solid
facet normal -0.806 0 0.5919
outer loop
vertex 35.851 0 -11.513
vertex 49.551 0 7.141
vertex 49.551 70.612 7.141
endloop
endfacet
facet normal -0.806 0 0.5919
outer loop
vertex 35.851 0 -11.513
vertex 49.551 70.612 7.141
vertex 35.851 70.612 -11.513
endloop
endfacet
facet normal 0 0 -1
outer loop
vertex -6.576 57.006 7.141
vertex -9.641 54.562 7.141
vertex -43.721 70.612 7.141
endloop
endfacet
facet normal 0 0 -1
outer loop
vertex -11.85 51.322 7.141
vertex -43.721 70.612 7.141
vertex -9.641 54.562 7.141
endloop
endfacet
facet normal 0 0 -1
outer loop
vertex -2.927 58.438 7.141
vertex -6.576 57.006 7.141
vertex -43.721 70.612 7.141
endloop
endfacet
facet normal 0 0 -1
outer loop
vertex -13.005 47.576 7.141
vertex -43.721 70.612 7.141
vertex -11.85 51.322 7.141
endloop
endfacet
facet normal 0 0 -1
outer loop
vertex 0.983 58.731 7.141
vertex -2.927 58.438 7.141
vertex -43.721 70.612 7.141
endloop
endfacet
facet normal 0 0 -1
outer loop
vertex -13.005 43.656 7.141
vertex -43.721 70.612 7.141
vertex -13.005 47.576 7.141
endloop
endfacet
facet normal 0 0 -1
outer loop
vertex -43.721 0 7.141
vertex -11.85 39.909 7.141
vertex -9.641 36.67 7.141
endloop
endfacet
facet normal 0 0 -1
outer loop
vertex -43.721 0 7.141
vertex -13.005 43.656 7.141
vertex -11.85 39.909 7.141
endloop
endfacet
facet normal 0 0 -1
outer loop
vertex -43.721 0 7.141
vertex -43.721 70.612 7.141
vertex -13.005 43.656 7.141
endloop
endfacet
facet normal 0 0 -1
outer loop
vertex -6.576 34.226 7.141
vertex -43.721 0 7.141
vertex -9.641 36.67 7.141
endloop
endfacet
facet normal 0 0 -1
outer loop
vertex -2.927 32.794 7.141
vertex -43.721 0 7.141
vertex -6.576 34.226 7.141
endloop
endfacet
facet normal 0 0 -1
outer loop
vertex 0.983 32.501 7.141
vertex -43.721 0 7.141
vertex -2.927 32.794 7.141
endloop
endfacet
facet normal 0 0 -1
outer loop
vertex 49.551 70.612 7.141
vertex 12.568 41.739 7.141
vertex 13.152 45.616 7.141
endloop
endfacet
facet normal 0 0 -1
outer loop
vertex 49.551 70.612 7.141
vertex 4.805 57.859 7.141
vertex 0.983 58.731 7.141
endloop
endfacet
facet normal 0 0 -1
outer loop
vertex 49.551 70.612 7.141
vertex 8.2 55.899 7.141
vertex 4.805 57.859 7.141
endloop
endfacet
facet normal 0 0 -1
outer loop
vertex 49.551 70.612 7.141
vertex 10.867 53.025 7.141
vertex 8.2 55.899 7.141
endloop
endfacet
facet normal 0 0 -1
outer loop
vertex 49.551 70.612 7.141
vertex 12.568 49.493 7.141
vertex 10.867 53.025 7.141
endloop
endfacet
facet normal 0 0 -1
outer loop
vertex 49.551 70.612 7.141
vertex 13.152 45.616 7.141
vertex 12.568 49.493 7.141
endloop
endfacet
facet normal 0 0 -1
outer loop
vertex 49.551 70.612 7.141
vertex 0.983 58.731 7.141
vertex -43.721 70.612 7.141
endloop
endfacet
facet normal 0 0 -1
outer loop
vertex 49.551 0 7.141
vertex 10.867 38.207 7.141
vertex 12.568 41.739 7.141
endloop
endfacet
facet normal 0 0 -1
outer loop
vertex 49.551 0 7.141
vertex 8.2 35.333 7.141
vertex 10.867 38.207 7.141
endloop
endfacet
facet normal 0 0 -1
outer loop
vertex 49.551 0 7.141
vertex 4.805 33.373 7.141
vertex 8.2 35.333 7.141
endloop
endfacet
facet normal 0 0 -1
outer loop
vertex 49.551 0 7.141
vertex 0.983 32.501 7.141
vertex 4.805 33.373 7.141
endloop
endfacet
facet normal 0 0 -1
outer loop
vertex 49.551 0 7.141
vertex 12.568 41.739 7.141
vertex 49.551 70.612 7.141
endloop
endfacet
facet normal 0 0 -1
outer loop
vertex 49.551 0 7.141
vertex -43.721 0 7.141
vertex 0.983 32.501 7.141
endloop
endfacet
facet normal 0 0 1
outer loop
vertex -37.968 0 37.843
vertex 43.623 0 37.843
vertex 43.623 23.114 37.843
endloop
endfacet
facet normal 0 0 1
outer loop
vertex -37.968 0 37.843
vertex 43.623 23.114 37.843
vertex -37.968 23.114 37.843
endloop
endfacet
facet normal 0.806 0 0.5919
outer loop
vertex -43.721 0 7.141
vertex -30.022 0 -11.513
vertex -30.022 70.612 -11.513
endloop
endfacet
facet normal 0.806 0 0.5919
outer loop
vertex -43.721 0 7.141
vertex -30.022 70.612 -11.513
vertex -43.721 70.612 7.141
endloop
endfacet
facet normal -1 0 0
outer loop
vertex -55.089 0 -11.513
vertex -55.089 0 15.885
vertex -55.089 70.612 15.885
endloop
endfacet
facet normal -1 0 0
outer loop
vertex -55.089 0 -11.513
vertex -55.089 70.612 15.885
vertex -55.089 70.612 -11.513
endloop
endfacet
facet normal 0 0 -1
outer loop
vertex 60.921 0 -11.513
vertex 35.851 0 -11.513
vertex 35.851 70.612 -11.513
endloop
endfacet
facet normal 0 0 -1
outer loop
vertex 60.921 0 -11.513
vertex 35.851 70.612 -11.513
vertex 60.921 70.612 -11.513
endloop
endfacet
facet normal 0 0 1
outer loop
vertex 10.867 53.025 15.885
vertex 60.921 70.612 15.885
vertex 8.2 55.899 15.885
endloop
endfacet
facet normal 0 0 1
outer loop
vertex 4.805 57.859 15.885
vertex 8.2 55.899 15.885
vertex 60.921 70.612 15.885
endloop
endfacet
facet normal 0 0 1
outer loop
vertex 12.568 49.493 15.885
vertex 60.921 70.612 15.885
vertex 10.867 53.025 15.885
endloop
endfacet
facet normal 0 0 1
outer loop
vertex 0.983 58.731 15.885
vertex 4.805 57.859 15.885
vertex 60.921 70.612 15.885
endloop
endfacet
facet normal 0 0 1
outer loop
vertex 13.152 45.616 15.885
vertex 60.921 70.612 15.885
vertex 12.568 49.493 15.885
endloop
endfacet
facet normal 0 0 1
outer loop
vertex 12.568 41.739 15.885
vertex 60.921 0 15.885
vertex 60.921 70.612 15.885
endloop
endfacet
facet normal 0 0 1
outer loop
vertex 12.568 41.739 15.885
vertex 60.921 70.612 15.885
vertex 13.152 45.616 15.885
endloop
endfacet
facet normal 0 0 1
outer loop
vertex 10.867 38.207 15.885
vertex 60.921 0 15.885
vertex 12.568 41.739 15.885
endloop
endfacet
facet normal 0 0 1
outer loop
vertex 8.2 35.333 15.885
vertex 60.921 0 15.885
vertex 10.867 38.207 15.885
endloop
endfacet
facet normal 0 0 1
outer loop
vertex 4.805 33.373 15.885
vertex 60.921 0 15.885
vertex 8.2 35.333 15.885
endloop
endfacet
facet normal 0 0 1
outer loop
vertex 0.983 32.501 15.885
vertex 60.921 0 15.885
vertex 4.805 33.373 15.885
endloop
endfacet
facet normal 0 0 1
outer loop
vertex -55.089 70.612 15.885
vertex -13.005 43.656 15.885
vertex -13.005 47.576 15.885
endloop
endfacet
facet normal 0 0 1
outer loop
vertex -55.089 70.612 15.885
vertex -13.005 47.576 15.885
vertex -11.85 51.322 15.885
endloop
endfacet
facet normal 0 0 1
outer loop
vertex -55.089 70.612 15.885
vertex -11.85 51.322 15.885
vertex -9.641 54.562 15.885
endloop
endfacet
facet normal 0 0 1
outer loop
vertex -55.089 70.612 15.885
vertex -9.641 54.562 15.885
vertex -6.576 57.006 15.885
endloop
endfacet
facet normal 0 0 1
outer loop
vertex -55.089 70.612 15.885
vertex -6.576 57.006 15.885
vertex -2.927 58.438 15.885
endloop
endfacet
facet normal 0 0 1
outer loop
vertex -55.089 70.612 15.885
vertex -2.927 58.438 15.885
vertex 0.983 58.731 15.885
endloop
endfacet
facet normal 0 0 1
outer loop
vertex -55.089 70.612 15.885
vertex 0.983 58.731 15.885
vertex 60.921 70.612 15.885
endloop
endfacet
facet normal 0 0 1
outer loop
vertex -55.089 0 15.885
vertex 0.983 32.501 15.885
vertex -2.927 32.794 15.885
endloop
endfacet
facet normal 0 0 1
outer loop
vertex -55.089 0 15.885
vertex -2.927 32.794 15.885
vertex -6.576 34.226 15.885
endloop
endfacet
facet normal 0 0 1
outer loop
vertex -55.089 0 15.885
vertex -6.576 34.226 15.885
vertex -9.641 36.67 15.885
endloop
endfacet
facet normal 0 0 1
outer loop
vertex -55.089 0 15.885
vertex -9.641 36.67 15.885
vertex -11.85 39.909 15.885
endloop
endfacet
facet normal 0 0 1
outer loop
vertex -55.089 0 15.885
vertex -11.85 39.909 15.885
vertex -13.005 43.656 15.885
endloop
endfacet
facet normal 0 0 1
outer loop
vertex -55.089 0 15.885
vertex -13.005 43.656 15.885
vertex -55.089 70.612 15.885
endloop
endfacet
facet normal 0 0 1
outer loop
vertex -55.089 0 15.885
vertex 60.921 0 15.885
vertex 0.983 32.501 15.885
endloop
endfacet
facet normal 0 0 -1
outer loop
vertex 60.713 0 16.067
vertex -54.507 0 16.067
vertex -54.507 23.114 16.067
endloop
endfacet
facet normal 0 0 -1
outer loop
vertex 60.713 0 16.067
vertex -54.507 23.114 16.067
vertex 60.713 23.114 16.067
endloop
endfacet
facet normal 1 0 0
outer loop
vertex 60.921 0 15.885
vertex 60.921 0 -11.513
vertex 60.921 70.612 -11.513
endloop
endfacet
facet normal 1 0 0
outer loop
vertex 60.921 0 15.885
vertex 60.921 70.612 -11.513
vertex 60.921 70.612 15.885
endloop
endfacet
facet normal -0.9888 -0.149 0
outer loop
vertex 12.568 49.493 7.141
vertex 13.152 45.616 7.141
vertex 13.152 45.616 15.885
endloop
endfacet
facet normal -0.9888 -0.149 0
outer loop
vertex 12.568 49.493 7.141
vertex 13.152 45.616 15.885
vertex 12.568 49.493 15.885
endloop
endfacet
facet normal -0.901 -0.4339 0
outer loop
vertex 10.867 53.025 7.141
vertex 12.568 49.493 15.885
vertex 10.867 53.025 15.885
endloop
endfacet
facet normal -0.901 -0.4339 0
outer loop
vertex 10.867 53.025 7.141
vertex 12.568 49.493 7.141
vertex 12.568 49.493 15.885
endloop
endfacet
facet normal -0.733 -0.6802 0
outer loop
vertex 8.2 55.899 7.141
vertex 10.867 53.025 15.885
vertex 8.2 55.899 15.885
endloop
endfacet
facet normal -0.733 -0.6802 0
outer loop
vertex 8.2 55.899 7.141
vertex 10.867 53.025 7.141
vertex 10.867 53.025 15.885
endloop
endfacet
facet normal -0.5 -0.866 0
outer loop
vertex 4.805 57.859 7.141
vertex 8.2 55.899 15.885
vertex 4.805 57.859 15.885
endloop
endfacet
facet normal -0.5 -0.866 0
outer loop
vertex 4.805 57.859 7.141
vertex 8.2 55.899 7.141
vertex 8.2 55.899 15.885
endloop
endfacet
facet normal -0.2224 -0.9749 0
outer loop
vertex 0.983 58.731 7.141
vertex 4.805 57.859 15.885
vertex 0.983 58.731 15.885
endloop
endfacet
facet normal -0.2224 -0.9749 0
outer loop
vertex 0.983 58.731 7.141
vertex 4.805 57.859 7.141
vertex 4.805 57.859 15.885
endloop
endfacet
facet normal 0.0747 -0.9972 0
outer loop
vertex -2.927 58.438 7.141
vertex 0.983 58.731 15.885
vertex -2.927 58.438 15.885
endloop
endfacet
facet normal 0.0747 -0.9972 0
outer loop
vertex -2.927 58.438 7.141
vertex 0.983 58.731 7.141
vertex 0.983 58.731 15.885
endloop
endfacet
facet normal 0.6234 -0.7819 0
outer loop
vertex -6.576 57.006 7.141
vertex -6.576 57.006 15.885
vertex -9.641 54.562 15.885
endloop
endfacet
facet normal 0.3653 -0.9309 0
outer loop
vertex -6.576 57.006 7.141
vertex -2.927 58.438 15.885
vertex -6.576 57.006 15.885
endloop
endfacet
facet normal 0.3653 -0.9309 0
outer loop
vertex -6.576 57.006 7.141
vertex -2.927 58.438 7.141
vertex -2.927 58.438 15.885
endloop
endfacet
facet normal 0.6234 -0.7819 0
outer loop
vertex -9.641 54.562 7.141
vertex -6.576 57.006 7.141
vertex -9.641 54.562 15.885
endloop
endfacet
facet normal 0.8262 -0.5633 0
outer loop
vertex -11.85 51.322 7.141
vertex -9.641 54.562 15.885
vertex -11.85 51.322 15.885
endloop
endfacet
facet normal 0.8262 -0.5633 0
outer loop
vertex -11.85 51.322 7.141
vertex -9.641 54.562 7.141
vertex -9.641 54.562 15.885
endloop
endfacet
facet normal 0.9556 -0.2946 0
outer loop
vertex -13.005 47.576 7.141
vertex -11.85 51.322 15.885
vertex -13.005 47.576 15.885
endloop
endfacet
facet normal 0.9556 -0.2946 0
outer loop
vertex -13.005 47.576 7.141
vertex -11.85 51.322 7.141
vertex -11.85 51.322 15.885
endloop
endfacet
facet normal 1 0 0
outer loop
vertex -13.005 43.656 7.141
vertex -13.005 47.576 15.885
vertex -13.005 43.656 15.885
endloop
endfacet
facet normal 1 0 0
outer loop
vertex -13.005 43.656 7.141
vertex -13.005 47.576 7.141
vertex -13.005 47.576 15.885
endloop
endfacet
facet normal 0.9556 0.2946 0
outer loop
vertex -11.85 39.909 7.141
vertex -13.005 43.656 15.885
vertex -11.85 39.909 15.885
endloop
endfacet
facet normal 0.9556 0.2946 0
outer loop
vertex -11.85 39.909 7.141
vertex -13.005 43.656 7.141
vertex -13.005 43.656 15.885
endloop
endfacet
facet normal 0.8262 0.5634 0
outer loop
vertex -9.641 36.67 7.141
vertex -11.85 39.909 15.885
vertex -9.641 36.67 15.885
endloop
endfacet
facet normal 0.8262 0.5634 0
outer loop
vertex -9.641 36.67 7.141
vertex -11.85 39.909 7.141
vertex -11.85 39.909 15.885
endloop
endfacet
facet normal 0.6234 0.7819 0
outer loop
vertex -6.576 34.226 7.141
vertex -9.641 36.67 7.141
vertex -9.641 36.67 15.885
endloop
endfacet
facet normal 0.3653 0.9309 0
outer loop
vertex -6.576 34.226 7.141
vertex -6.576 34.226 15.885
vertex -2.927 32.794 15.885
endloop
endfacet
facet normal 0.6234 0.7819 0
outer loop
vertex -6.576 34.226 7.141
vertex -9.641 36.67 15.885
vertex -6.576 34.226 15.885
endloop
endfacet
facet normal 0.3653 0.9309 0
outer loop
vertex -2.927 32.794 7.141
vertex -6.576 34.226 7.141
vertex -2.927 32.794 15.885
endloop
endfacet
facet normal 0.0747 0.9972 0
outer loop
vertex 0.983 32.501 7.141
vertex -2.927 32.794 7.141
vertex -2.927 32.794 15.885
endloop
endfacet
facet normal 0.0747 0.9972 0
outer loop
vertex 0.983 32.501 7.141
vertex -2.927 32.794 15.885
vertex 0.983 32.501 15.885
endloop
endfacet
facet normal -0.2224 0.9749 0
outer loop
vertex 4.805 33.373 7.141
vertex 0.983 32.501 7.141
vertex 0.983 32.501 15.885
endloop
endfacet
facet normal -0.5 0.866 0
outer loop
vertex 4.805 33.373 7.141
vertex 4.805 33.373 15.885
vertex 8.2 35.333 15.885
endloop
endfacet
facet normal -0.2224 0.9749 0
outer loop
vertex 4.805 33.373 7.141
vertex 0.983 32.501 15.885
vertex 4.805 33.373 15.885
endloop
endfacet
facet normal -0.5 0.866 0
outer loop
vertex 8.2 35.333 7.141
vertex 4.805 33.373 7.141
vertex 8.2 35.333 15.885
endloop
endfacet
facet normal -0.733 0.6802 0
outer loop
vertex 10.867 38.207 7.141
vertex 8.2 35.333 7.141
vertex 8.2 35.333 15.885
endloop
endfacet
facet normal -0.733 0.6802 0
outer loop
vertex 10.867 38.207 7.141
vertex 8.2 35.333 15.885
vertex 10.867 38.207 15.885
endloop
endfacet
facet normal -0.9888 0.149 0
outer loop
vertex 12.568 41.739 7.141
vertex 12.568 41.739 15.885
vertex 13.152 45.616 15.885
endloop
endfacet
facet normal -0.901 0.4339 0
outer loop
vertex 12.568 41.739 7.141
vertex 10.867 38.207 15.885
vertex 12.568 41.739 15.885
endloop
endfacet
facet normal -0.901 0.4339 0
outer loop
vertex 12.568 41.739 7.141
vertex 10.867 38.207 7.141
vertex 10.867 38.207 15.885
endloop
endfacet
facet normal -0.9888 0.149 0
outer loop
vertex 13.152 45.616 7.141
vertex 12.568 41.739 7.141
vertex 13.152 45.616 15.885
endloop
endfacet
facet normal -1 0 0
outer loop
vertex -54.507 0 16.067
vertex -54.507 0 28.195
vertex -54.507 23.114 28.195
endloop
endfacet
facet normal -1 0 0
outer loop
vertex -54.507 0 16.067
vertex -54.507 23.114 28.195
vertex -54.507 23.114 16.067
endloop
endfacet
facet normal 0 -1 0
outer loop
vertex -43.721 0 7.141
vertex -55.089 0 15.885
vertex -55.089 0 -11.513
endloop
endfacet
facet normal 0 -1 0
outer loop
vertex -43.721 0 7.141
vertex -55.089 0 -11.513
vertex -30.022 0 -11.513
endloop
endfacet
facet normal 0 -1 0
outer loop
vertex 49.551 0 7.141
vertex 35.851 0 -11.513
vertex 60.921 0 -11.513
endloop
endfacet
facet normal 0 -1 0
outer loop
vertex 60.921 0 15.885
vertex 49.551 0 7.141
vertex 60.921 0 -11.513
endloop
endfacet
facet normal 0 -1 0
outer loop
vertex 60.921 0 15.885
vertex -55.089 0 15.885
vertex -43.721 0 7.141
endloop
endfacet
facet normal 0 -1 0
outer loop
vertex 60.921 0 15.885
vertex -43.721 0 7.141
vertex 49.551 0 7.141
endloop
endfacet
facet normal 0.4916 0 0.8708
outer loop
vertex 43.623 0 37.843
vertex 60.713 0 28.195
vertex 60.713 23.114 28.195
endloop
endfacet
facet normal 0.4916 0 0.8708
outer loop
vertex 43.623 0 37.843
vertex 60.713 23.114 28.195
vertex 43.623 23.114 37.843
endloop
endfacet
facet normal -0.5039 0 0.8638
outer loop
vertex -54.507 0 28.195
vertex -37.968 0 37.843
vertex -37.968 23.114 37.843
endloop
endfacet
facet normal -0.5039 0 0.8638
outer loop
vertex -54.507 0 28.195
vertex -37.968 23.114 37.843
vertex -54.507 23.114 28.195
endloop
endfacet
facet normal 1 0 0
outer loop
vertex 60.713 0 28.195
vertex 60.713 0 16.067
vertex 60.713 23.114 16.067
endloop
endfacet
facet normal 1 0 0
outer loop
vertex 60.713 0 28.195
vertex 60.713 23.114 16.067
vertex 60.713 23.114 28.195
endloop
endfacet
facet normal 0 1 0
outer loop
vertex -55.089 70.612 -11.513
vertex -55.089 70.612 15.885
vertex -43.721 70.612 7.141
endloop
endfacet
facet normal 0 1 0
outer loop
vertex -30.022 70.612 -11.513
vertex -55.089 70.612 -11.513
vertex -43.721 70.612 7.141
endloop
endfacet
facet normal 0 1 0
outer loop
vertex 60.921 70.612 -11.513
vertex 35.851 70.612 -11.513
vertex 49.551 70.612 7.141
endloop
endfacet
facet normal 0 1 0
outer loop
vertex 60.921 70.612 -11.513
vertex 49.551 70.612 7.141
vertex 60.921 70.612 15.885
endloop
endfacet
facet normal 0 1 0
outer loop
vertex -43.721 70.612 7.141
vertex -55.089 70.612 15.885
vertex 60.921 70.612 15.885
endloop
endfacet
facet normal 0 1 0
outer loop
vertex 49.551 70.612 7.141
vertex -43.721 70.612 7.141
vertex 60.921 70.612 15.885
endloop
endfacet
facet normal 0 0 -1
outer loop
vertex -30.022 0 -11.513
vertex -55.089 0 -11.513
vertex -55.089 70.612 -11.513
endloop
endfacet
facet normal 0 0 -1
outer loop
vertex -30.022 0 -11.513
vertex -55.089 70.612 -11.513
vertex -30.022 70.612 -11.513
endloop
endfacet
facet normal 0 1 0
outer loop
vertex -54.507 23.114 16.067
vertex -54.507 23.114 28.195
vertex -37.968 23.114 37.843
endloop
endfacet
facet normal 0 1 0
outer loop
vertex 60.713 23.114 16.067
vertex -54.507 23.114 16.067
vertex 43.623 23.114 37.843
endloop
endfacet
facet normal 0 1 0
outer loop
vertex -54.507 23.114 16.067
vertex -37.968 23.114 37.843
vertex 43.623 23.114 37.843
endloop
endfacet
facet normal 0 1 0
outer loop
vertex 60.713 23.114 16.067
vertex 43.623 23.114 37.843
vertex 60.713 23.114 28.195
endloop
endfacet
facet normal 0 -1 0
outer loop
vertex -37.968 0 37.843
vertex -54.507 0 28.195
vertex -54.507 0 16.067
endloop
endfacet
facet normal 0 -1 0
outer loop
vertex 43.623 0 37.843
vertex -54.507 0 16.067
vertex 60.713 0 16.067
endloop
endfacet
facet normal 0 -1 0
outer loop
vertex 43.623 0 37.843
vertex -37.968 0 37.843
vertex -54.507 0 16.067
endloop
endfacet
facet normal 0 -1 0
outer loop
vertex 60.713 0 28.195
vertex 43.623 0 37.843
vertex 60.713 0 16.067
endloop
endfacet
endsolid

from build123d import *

# Parameters (mm, degrees)
F1_DEPTH = 70.612
F3_DEPTH = 23.114
F4_R     = 13.15197
F5_DEPTH = 25.4


with BuildPart() as f1:
    # F0 (on Front) → F1 (new body)
    with BuildSketch(Plane.XZ):
        Polygon((60.921275, 15.885411), (-55.088852, 15.885411), (-55.088852, -11.513279), (-30.021966, -11.513279), (-43.721311, 7.141148), (49.550828, 7.141148), (35.851475, -11.513279), (60.921275, -11.513279), align=None)
    extrude(amount=-F1_DEPTH)

    # F4 (on Top) → F5 (cut)
    with BuildSketch(Plane.XY):
        with Locations((0, 45.6159)):
            Circle(F4_R)
    extrude(amount=F5_DEPTH, mode=Mode.SUBTRACT)


with BuildPart() as f3:
    # F2 (on Front) → F3 (new body)
    with BuildSketch(Plane.XZ):
        Polygon((-54.507092, 16.066594), (60.713094, 16.066594), (60.713094, 28.195035), (43.623019, 37.842657), (-37.968308, 37.842657), (-54.507092, 28.195035), align=None)
    extrude(amount=-F3_DEPTH)


solid = Compound([f1.part, f3.part])
